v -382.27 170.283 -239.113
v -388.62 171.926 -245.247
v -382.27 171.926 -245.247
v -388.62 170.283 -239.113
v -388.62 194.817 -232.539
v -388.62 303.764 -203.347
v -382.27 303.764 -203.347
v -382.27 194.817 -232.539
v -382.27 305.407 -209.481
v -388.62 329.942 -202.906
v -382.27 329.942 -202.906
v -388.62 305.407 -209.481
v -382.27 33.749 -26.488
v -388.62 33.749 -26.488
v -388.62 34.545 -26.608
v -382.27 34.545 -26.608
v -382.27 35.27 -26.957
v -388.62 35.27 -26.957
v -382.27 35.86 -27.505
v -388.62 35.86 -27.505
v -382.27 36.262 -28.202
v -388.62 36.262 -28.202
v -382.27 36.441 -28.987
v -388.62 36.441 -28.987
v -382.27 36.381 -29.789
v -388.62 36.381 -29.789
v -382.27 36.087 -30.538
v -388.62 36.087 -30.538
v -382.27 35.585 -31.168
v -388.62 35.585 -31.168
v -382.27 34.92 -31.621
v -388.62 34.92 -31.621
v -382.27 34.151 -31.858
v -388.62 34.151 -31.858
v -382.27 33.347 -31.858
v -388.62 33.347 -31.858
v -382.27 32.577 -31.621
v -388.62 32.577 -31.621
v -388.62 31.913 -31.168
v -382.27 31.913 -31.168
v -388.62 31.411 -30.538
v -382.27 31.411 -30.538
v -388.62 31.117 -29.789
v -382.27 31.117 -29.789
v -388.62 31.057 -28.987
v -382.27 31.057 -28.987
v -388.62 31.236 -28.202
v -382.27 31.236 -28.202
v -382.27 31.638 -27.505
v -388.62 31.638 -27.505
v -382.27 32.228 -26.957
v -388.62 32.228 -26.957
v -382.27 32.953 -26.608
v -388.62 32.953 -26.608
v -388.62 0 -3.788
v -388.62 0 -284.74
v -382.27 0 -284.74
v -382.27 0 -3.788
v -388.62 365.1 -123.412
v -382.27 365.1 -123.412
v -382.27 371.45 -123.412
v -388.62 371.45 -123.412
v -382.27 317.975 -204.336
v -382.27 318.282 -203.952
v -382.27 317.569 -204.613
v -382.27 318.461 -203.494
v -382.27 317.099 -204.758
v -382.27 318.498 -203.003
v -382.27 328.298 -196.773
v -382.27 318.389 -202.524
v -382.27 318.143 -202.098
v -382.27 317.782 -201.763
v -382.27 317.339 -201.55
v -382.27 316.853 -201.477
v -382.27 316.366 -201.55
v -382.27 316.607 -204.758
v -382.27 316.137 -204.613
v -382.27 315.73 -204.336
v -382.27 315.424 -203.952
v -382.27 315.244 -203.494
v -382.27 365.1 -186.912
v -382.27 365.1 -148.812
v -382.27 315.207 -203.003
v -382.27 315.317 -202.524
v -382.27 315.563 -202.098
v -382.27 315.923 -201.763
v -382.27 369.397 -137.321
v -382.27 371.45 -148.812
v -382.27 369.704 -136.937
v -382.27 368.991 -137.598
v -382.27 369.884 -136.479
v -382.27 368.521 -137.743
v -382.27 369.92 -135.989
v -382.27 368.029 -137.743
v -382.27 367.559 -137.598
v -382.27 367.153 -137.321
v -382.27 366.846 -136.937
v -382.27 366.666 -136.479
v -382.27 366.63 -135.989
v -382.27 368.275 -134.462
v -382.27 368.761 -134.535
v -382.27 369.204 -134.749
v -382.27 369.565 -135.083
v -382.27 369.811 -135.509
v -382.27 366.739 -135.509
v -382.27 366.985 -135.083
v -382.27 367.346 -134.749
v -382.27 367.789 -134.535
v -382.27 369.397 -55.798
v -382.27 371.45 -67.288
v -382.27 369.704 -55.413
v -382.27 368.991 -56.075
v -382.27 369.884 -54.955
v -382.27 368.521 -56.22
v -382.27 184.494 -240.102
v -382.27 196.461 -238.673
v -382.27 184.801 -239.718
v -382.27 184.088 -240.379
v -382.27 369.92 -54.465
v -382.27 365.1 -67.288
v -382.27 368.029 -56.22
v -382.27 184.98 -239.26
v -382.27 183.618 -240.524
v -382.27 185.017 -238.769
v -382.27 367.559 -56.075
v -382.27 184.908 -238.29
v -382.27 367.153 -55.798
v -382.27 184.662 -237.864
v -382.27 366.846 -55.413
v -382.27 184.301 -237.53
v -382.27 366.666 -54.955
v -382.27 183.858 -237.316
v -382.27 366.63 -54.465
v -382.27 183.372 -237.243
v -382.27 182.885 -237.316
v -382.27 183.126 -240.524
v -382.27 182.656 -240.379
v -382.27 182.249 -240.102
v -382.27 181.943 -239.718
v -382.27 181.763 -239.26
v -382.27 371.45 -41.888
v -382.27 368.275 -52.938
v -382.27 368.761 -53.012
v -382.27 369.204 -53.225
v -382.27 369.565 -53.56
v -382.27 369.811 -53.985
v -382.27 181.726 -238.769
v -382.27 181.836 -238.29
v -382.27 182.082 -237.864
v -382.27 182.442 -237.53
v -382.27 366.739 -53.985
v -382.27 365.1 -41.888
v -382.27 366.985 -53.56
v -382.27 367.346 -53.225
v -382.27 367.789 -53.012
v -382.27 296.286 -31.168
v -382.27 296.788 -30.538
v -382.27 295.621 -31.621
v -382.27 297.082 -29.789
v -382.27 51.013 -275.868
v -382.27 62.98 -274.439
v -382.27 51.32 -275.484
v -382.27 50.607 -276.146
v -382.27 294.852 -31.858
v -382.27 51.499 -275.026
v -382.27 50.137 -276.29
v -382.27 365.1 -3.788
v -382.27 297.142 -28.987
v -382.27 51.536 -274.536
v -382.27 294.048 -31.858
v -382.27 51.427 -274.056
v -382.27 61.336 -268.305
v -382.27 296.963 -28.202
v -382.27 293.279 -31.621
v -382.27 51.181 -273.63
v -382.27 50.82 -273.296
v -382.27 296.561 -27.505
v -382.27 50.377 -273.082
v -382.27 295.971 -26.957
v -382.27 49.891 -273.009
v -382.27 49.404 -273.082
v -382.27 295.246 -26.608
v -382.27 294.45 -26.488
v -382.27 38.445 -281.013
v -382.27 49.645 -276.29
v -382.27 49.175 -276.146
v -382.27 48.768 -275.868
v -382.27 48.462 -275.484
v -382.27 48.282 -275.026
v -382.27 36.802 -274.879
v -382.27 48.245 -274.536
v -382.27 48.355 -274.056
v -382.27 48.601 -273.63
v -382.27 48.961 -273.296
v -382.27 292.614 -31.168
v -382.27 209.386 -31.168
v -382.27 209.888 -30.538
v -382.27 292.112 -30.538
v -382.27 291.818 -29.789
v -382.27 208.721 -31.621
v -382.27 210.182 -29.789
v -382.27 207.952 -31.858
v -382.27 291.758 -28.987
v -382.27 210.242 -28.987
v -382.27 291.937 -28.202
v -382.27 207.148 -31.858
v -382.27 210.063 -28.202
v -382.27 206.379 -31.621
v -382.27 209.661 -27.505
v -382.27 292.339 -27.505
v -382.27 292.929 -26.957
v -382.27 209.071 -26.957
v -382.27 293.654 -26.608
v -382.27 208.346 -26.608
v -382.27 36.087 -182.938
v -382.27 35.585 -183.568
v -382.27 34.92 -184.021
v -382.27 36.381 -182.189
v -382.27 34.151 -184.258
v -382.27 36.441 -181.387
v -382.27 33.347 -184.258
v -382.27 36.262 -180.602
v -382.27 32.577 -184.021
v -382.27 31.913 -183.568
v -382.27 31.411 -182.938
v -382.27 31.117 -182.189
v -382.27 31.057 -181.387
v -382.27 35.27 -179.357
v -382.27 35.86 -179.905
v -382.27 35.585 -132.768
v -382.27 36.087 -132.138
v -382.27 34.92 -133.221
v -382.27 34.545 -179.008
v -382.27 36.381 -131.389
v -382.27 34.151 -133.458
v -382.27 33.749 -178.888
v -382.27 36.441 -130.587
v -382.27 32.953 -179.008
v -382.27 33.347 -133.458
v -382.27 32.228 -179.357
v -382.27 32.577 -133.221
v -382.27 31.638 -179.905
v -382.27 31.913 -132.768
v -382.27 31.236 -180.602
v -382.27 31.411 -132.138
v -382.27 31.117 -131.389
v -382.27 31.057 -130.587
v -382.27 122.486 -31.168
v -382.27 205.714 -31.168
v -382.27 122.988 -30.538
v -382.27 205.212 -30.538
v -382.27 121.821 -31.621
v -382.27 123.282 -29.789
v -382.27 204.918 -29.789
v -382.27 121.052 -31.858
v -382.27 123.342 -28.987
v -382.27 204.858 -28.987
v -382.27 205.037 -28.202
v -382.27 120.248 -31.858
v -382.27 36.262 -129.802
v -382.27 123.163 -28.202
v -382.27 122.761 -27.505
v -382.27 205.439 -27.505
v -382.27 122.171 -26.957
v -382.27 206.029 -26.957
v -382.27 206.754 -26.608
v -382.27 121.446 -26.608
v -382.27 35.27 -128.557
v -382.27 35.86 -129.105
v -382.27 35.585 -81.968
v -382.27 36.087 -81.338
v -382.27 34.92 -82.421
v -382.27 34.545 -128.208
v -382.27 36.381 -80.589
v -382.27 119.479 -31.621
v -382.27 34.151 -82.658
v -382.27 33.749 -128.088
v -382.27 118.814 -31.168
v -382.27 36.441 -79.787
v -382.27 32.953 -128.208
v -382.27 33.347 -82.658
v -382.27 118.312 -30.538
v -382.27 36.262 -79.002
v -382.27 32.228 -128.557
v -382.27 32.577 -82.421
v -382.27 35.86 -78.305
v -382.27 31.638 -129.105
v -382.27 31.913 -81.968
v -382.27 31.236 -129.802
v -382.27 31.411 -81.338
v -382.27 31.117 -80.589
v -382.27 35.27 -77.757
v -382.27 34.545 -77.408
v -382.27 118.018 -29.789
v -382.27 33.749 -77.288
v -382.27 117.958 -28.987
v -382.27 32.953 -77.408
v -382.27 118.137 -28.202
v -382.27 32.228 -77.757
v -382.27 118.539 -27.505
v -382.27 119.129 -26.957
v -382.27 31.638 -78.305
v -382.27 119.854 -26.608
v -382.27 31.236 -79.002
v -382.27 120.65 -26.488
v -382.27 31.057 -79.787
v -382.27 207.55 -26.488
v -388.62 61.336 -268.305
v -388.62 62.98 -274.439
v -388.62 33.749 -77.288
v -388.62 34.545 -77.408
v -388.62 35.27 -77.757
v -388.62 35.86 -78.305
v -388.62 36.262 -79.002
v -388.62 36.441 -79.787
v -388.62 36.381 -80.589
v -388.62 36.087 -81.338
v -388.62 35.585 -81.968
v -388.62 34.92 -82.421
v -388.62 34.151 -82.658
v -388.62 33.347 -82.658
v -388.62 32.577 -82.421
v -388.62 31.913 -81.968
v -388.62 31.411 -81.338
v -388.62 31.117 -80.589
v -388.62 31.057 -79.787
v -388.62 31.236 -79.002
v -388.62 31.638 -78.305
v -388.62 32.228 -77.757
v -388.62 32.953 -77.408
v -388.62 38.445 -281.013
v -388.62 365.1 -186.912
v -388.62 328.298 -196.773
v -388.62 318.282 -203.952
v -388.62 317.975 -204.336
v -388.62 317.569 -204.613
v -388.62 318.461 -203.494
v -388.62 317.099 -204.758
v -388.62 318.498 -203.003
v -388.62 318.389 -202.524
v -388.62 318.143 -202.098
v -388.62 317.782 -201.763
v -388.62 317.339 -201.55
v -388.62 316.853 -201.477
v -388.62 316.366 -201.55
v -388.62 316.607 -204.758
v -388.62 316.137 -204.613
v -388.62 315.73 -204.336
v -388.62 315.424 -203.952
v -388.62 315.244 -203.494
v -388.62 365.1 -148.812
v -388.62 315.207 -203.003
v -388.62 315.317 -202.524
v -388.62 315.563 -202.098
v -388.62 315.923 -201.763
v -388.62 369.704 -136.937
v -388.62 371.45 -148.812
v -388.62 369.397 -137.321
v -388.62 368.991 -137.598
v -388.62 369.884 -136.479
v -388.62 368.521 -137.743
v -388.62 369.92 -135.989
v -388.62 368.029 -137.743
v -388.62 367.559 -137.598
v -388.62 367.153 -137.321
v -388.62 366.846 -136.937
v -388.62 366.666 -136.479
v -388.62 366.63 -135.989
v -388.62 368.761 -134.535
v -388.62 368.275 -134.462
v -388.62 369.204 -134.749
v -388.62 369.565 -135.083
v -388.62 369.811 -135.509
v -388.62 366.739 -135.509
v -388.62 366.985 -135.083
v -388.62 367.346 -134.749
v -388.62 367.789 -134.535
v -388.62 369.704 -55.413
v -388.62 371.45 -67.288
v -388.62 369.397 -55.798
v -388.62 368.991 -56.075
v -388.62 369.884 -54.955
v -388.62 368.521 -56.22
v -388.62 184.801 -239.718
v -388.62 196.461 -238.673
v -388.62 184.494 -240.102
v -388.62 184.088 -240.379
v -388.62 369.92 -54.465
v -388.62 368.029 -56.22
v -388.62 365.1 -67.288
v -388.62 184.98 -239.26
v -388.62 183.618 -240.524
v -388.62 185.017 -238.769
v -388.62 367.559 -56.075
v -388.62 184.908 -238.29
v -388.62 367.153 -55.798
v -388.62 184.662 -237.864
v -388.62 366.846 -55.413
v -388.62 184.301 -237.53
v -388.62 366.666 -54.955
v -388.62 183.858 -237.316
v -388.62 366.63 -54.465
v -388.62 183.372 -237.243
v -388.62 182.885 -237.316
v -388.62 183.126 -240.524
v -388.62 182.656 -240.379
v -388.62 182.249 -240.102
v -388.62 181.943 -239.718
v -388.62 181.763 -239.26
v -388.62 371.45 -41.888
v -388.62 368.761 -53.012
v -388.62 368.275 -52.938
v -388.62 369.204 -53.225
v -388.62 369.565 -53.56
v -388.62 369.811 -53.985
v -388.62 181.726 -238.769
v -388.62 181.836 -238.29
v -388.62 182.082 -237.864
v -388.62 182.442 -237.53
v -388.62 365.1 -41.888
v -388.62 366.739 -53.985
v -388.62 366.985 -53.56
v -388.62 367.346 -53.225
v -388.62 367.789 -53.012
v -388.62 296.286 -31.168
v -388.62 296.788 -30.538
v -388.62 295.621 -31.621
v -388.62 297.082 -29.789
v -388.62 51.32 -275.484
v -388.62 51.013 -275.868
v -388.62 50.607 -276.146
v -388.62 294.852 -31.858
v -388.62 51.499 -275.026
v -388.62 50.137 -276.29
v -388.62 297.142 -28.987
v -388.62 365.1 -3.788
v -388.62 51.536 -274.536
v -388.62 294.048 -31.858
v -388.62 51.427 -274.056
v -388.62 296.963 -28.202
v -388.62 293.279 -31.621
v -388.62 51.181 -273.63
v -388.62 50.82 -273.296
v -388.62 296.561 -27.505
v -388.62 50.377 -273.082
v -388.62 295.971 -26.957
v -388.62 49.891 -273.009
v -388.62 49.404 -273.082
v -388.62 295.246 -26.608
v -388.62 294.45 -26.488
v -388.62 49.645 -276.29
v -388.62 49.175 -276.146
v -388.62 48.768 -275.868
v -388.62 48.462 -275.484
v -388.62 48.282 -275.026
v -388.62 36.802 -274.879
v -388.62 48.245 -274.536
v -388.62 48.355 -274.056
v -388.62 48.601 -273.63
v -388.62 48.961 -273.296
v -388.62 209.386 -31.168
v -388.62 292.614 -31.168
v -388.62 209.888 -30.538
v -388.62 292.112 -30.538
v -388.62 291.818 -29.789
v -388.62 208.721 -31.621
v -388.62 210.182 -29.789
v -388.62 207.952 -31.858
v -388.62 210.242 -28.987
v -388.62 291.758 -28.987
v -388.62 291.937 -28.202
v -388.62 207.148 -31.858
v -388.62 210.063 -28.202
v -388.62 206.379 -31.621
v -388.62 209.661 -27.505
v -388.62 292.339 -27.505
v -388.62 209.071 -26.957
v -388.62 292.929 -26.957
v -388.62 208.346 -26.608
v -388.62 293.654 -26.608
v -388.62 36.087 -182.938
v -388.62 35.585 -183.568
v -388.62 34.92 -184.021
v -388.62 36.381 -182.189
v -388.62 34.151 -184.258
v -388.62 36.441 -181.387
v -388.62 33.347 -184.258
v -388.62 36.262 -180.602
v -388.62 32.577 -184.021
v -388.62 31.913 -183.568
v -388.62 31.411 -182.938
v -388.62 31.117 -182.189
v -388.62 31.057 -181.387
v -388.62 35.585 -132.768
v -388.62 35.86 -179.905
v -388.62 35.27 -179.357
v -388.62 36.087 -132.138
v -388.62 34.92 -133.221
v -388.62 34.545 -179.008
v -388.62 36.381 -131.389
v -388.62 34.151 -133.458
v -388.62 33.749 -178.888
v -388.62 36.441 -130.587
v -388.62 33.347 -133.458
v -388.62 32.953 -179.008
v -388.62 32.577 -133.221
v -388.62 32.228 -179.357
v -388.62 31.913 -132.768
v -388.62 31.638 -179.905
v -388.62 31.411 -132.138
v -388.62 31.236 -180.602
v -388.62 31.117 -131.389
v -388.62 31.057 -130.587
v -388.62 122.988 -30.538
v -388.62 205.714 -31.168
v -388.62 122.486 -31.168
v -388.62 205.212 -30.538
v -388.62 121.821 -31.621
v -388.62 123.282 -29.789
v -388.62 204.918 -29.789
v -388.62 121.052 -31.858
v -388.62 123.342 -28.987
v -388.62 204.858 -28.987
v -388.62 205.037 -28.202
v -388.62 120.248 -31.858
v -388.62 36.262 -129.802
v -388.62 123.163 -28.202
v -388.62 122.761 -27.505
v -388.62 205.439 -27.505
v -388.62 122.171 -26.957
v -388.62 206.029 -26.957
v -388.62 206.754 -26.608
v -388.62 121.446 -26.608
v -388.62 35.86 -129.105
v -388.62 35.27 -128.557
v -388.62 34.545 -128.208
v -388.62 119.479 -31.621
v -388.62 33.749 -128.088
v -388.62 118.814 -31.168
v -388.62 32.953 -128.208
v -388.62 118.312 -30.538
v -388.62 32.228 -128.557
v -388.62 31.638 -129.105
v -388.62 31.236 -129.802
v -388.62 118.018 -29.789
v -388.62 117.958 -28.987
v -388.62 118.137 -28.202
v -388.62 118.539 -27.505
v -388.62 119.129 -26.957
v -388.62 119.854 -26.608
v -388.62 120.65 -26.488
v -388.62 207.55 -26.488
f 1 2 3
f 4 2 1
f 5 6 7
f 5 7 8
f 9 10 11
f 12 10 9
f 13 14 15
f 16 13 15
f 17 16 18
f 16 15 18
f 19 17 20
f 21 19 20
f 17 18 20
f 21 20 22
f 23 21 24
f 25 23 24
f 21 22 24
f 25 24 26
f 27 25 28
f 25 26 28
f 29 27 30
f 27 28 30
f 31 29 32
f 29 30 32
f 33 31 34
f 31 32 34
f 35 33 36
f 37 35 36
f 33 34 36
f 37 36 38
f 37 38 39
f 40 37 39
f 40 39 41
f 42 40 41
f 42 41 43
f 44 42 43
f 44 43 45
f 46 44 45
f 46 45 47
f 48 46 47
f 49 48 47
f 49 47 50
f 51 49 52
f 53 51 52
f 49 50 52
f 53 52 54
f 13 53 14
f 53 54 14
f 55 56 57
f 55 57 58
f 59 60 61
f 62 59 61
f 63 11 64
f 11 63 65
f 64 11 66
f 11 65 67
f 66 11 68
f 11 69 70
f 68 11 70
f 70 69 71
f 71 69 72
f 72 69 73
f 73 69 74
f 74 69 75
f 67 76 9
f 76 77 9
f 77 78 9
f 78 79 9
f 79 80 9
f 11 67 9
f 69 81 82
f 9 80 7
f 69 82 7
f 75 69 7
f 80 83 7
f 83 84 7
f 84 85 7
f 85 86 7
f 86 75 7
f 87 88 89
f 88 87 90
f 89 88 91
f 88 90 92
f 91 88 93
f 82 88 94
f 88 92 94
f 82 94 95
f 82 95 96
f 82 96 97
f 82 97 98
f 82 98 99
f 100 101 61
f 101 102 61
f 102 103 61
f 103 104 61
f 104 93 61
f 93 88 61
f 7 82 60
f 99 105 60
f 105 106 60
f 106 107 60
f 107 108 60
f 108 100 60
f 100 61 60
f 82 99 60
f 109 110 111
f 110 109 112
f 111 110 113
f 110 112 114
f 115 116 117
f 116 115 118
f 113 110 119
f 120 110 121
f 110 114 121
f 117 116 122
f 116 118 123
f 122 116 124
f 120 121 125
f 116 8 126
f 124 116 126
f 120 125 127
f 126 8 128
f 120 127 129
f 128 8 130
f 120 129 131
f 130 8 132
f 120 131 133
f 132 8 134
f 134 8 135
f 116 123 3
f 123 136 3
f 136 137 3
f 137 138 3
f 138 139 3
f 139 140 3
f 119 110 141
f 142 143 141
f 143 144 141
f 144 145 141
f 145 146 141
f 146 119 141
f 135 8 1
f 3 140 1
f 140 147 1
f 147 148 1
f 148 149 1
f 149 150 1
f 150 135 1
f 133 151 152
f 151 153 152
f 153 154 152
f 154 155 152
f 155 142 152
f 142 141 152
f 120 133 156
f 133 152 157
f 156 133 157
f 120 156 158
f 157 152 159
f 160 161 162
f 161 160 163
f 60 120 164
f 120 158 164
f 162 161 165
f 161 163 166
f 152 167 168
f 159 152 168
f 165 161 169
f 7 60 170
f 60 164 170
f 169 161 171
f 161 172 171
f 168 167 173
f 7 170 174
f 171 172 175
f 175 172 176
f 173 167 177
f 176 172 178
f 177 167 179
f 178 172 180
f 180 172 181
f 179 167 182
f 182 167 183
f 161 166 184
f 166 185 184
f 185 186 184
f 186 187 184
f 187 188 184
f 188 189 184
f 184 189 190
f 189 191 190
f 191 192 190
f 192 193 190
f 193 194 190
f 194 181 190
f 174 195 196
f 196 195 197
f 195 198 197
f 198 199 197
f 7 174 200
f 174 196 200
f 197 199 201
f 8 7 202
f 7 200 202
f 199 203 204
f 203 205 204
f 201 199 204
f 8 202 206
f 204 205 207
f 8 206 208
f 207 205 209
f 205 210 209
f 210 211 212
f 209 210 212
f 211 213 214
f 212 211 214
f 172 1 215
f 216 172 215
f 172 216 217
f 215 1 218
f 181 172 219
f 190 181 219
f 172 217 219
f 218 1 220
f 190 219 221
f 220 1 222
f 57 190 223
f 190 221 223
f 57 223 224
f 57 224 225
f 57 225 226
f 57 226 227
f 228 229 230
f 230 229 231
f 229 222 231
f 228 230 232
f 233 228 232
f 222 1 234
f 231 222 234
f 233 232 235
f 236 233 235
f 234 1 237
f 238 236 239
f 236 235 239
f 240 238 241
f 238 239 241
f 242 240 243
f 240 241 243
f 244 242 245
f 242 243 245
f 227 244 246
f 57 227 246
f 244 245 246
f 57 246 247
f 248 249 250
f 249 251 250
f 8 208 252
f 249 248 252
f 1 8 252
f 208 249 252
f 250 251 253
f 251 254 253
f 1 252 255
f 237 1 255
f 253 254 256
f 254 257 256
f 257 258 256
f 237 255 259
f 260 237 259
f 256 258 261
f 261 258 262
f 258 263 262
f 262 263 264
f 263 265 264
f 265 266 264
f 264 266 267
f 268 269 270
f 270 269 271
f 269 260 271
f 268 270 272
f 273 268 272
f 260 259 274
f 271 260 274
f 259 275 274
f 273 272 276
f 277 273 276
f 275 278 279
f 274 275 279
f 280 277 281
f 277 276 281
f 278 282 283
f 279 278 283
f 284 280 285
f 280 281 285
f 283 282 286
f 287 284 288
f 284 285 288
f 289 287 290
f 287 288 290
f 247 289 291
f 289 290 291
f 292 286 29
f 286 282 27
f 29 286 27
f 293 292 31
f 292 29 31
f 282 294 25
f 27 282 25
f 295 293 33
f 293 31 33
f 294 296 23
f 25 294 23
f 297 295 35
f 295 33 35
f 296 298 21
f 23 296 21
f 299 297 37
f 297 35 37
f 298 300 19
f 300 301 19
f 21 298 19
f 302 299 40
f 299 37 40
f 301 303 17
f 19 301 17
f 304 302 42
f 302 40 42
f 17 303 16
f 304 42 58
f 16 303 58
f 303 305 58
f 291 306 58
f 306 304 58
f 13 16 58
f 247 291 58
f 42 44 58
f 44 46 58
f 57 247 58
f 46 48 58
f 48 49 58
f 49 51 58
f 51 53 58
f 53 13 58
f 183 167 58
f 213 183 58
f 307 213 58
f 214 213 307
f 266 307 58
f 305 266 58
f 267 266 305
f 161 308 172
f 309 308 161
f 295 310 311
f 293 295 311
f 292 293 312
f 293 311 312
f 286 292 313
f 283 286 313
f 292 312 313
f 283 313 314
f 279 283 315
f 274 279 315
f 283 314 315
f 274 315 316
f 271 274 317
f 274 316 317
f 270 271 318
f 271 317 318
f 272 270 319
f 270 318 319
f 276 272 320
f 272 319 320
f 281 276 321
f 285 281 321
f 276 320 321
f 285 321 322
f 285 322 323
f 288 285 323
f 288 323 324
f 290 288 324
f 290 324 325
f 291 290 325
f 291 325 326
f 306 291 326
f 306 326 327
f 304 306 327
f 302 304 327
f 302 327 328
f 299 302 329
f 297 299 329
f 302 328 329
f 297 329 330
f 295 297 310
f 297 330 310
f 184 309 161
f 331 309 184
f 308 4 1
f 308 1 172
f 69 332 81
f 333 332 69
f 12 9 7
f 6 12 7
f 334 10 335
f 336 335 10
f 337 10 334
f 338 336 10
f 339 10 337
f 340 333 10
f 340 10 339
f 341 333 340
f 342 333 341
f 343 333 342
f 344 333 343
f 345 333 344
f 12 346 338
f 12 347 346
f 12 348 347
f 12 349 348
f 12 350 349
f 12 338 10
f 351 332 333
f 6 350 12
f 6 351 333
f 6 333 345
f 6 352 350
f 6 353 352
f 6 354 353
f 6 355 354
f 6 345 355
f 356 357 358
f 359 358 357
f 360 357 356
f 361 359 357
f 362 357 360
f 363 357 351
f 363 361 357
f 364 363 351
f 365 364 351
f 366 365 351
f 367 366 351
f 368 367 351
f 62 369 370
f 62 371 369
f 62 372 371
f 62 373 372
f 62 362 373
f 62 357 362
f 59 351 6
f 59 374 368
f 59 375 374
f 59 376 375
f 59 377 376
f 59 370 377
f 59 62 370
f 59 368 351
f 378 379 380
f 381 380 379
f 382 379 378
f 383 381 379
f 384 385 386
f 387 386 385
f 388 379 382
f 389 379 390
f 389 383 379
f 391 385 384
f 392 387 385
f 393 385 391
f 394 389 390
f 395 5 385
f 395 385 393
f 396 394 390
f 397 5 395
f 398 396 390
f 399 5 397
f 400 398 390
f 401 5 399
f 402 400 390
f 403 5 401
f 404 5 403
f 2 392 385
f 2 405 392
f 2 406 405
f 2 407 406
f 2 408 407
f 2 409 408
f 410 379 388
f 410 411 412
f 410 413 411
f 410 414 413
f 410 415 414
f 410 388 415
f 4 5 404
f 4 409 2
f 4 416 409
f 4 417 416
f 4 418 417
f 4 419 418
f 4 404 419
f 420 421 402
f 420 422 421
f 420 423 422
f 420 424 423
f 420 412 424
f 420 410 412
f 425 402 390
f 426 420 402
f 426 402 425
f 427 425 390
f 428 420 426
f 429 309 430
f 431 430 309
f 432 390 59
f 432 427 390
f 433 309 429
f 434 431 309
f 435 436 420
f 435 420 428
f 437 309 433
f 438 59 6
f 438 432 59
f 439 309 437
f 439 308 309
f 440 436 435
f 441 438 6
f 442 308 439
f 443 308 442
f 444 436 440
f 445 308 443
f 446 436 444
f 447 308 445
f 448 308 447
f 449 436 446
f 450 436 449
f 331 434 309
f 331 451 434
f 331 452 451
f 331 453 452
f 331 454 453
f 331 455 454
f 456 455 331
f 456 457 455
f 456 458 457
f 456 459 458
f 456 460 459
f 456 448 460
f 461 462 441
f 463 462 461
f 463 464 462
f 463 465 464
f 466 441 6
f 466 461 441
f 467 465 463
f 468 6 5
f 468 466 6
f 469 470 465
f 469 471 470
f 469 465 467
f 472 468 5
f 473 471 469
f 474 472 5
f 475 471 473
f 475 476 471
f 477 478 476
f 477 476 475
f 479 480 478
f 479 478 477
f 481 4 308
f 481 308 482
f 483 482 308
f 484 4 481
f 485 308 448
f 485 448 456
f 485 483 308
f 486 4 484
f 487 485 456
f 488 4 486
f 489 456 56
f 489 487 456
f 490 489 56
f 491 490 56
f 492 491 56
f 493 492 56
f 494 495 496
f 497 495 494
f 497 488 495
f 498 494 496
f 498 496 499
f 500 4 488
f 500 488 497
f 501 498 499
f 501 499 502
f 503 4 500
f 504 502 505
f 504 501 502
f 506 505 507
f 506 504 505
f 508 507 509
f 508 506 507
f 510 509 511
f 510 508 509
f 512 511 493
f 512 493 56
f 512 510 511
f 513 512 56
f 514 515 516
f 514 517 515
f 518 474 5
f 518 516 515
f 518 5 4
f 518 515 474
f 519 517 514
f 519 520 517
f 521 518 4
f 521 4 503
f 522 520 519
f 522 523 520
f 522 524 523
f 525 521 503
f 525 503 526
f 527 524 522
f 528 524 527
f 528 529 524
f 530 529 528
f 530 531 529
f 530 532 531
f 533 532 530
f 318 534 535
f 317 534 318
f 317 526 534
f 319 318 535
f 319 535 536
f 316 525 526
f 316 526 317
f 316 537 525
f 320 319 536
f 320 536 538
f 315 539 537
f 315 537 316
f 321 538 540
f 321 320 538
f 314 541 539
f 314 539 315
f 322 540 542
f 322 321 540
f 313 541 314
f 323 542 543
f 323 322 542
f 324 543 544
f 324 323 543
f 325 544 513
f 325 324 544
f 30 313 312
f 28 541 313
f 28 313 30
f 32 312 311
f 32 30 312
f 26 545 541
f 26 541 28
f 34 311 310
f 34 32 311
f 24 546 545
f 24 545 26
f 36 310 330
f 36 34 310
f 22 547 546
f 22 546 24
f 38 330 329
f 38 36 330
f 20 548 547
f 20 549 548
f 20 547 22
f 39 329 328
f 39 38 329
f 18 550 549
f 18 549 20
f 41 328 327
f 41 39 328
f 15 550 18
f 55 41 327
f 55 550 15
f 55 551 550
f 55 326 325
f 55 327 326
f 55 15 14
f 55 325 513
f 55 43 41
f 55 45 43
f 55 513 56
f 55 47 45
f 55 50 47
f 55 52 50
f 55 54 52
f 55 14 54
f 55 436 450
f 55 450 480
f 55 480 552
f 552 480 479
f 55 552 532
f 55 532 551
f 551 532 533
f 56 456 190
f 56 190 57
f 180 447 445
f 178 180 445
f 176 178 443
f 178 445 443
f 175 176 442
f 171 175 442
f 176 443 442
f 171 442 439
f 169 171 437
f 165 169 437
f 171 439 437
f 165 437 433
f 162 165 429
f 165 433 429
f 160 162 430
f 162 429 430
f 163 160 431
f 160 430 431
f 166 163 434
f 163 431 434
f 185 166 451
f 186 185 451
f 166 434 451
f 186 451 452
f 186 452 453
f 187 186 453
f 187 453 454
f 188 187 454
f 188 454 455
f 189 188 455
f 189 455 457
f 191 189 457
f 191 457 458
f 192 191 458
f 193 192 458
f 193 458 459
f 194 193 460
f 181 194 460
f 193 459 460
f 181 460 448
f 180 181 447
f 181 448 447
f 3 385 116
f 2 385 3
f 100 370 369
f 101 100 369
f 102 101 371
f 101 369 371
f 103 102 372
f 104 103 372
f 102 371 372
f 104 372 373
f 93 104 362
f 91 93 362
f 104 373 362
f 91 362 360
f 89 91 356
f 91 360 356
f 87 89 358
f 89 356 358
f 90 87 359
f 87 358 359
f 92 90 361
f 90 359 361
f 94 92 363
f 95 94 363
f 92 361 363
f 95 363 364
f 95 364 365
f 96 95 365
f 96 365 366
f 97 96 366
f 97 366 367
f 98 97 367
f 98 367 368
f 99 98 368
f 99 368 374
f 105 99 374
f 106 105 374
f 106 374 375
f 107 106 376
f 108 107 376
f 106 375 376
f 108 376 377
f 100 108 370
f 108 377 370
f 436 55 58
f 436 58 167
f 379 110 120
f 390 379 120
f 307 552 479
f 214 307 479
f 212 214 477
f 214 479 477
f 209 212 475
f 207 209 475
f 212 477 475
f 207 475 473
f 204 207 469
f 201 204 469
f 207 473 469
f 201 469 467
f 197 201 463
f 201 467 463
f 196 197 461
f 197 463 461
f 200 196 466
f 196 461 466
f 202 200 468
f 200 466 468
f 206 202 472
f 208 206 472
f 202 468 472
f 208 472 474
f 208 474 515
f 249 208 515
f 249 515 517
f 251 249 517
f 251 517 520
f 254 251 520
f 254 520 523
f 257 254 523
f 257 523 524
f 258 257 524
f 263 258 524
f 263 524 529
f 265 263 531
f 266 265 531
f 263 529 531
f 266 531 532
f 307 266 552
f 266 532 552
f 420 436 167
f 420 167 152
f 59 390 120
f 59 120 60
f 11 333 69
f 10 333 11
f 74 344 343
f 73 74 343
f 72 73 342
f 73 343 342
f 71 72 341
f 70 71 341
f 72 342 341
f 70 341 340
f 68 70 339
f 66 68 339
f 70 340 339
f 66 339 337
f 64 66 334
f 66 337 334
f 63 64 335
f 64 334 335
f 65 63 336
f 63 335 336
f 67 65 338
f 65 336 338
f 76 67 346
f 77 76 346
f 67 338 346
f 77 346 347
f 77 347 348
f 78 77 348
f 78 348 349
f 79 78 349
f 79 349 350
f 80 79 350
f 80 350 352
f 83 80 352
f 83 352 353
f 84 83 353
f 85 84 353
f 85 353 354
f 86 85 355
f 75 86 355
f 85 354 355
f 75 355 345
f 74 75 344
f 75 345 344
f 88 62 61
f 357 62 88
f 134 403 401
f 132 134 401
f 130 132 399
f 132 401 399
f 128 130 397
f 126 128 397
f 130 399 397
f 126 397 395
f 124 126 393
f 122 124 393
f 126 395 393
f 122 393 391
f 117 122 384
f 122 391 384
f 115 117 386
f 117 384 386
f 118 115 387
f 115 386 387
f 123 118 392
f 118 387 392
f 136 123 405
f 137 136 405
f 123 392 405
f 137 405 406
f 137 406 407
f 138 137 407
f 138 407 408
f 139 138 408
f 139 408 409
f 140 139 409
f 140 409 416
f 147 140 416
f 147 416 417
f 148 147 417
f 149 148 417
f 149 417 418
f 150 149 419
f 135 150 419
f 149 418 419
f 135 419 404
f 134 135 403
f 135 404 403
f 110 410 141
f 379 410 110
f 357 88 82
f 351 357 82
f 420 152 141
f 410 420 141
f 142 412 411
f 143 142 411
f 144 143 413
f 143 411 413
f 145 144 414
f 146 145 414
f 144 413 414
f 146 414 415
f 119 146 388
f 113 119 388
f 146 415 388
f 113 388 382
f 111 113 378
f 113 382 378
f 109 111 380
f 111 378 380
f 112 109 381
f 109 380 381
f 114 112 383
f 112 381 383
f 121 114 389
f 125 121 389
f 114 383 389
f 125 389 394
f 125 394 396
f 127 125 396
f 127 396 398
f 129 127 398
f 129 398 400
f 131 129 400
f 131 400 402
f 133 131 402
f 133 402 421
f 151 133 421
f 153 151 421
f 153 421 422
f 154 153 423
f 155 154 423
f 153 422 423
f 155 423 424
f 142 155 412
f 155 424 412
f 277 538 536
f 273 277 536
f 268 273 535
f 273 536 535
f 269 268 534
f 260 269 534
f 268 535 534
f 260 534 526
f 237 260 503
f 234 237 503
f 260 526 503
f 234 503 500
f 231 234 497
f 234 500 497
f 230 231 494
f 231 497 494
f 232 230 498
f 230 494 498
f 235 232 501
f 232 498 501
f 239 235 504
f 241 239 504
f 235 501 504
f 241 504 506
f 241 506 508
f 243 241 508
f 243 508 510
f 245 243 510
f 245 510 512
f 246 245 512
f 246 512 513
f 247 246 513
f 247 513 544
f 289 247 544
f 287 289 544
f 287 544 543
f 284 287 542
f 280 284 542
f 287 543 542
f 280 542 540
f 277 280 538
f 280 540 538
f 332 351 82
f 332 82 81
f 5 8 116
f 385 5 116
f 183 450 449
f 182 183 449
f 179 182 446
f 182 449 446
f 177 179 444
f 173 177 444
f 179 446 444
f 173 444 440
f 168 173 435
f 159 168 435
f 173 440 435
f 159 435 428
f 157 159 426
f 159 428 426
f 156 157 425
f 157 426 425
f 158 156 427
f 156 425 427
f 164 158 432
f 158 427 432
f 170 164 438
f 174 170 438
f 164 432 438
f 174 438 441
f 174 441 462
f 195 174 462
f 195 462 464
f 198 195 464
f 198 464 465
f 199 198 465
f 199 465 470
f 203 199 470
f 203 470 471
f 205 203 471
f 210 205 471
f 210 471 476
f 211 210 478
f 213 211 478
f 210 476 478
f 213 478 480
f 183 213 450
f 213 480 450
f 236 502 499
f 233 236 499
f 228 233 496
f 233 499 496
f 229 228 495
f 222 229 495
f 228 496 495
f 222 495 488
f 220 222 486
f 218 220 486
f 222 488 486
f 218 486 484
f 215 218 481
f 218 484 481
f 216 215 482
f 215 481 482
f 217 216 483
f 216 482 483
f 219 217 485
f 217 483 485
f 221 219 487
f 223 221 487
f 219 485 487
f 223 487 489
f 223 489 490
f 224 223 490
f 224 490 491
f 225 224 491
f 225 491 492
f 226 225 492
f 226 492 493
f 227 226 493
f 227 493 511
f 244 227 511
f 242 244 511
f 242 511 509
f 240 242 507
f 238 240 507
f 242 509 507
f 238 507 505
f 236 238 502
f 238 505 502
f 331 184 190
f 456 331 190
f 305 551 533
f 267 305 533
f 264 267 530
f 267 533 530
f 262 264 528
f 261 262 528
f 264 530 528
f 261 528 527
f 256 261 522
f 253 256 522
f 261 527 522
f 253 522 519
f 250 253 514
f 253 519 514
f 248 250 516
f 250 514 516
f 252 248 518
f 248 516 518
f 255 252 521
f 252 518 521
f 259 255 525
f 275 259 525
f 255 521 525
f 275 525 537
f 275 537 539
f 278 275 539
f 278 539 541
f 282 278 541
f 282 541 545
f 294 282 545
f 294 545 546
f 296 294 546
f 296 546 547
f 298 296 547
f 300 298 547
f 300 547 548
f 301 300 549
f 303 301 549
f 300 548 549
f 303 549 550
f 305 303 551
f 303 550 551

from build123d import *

# Parameters (mm, degrees)
SKETCH1_R           = 1.65
SKETCH1_R_2         = 2.7
BOSS_EXTRUDE1_DEPTH = 6.35


with BuildPart() as part:
    # Sketch1 → Boss-Extrude1 (new body)
    with BuildSketch(Plane(origin=(-388.62, 0, 0), x_dir=(0, -1, 0), z_dir=(-1, 0, 0))):
        Polygon((-371.45, -148.811863322), (-365.1, -148.811863322), (-365.1, -186.911863322), (-328.298226018, -196.772868941), (-329.941726955, -202.906497938), (-305.407210967, -209.480501683), (-303.763710031, -203.346872686), (-194.817257994, -232.538986528), (-196.46075893, -238.672615525), (-171.926242943, -245.24661927), (-170.282742006, -239.112990273), (-61.336289969, -268.305104115), (-62.979790906, -274.438733112), (-38.445274918, -281.012736857), (-36.801773982, -274.87910786), (0, -284.740113479), (0, -3.788281448), (-365.1, -3.788281448), (-365.1, -41.888281448), (-371.45, -41.888281448), (-371.45, -67.288281448), (-365.1, -67.288281448), (-365.1, -123.411863322), (-371.45, -123.411863322), align=None)
        with Locations(Location((-49.890782444, -274.658920486, 0), (0, 0, 90))):
            Circle(SKETCH1_R, mode=Mode.SUBTRACT)
        with Locations(Location((-368.275, -54.588281448, 0), (0, 0, 90))):
            Circle(SKETCH1_R, mode=Mode.SUBTRACT)
        with Locations(Location((-183.371750468, -238.892802899, 0), (0, 0, 90))):
            Circle(SKETCH1_R, mode=Mode.SUBTRACT)
        with Locations(Location((-368.275, -136.111863322, 0), (0, 0, 90))):
            Circle(SKETCH1_R, mode=Mode.SUBTRACT)
        with Locations(Location((-316.852718493, -203.126685312, 0), (0, 0, 90))):
            Circle(SKETCH1_R, mode=Mode.SUBTRACT)
        with Locations(Location((-294.45, -29.188301448, 0), (0, 0, 90))):
            Circle(SKETCH1_R_2, mode=Mode.SUBTRACT)
        with Locations(Location((-207.55, -29.188301448, 0), (0, 0, 90))):
            Circle(SKETCH1_R_2, mode=Mode.SUBTRACT)
        with Locations(Location((-120.65, -29.188301448, 0), (0, 0, 90))):
            Circle(SKETCH1_R_2, mode=Mode.SUBTRACT)
        with Locations(Location((-33.74898, -181.588301448, 0), (0, 0, 90))):
            Circle(SKETCH1_R_2, mode=Mode.SUBTRACT)
        with Locations(Location((-33.74898, -29.188301448, 0), (0, 0, 90))):
            Circle(SKETCH1_R_2, mode=Mode.SUBTRACT)
        with Locations(Location((-33.74898, -130.788301448, 0), (0, 0, 90))):
            Circle(SKETCH1_R_2, mode=Mode.SUBTRACT)
        with Locations(Location((-33.74898, -79.988301448, 0), (0, 0, 90))):
            Circle(SKETCH1_R_2, mode=Mode.SUBTRACT)
    extrude(amount=-BOSS_EXTRUDE1_DEPTH)


solid = part.part
